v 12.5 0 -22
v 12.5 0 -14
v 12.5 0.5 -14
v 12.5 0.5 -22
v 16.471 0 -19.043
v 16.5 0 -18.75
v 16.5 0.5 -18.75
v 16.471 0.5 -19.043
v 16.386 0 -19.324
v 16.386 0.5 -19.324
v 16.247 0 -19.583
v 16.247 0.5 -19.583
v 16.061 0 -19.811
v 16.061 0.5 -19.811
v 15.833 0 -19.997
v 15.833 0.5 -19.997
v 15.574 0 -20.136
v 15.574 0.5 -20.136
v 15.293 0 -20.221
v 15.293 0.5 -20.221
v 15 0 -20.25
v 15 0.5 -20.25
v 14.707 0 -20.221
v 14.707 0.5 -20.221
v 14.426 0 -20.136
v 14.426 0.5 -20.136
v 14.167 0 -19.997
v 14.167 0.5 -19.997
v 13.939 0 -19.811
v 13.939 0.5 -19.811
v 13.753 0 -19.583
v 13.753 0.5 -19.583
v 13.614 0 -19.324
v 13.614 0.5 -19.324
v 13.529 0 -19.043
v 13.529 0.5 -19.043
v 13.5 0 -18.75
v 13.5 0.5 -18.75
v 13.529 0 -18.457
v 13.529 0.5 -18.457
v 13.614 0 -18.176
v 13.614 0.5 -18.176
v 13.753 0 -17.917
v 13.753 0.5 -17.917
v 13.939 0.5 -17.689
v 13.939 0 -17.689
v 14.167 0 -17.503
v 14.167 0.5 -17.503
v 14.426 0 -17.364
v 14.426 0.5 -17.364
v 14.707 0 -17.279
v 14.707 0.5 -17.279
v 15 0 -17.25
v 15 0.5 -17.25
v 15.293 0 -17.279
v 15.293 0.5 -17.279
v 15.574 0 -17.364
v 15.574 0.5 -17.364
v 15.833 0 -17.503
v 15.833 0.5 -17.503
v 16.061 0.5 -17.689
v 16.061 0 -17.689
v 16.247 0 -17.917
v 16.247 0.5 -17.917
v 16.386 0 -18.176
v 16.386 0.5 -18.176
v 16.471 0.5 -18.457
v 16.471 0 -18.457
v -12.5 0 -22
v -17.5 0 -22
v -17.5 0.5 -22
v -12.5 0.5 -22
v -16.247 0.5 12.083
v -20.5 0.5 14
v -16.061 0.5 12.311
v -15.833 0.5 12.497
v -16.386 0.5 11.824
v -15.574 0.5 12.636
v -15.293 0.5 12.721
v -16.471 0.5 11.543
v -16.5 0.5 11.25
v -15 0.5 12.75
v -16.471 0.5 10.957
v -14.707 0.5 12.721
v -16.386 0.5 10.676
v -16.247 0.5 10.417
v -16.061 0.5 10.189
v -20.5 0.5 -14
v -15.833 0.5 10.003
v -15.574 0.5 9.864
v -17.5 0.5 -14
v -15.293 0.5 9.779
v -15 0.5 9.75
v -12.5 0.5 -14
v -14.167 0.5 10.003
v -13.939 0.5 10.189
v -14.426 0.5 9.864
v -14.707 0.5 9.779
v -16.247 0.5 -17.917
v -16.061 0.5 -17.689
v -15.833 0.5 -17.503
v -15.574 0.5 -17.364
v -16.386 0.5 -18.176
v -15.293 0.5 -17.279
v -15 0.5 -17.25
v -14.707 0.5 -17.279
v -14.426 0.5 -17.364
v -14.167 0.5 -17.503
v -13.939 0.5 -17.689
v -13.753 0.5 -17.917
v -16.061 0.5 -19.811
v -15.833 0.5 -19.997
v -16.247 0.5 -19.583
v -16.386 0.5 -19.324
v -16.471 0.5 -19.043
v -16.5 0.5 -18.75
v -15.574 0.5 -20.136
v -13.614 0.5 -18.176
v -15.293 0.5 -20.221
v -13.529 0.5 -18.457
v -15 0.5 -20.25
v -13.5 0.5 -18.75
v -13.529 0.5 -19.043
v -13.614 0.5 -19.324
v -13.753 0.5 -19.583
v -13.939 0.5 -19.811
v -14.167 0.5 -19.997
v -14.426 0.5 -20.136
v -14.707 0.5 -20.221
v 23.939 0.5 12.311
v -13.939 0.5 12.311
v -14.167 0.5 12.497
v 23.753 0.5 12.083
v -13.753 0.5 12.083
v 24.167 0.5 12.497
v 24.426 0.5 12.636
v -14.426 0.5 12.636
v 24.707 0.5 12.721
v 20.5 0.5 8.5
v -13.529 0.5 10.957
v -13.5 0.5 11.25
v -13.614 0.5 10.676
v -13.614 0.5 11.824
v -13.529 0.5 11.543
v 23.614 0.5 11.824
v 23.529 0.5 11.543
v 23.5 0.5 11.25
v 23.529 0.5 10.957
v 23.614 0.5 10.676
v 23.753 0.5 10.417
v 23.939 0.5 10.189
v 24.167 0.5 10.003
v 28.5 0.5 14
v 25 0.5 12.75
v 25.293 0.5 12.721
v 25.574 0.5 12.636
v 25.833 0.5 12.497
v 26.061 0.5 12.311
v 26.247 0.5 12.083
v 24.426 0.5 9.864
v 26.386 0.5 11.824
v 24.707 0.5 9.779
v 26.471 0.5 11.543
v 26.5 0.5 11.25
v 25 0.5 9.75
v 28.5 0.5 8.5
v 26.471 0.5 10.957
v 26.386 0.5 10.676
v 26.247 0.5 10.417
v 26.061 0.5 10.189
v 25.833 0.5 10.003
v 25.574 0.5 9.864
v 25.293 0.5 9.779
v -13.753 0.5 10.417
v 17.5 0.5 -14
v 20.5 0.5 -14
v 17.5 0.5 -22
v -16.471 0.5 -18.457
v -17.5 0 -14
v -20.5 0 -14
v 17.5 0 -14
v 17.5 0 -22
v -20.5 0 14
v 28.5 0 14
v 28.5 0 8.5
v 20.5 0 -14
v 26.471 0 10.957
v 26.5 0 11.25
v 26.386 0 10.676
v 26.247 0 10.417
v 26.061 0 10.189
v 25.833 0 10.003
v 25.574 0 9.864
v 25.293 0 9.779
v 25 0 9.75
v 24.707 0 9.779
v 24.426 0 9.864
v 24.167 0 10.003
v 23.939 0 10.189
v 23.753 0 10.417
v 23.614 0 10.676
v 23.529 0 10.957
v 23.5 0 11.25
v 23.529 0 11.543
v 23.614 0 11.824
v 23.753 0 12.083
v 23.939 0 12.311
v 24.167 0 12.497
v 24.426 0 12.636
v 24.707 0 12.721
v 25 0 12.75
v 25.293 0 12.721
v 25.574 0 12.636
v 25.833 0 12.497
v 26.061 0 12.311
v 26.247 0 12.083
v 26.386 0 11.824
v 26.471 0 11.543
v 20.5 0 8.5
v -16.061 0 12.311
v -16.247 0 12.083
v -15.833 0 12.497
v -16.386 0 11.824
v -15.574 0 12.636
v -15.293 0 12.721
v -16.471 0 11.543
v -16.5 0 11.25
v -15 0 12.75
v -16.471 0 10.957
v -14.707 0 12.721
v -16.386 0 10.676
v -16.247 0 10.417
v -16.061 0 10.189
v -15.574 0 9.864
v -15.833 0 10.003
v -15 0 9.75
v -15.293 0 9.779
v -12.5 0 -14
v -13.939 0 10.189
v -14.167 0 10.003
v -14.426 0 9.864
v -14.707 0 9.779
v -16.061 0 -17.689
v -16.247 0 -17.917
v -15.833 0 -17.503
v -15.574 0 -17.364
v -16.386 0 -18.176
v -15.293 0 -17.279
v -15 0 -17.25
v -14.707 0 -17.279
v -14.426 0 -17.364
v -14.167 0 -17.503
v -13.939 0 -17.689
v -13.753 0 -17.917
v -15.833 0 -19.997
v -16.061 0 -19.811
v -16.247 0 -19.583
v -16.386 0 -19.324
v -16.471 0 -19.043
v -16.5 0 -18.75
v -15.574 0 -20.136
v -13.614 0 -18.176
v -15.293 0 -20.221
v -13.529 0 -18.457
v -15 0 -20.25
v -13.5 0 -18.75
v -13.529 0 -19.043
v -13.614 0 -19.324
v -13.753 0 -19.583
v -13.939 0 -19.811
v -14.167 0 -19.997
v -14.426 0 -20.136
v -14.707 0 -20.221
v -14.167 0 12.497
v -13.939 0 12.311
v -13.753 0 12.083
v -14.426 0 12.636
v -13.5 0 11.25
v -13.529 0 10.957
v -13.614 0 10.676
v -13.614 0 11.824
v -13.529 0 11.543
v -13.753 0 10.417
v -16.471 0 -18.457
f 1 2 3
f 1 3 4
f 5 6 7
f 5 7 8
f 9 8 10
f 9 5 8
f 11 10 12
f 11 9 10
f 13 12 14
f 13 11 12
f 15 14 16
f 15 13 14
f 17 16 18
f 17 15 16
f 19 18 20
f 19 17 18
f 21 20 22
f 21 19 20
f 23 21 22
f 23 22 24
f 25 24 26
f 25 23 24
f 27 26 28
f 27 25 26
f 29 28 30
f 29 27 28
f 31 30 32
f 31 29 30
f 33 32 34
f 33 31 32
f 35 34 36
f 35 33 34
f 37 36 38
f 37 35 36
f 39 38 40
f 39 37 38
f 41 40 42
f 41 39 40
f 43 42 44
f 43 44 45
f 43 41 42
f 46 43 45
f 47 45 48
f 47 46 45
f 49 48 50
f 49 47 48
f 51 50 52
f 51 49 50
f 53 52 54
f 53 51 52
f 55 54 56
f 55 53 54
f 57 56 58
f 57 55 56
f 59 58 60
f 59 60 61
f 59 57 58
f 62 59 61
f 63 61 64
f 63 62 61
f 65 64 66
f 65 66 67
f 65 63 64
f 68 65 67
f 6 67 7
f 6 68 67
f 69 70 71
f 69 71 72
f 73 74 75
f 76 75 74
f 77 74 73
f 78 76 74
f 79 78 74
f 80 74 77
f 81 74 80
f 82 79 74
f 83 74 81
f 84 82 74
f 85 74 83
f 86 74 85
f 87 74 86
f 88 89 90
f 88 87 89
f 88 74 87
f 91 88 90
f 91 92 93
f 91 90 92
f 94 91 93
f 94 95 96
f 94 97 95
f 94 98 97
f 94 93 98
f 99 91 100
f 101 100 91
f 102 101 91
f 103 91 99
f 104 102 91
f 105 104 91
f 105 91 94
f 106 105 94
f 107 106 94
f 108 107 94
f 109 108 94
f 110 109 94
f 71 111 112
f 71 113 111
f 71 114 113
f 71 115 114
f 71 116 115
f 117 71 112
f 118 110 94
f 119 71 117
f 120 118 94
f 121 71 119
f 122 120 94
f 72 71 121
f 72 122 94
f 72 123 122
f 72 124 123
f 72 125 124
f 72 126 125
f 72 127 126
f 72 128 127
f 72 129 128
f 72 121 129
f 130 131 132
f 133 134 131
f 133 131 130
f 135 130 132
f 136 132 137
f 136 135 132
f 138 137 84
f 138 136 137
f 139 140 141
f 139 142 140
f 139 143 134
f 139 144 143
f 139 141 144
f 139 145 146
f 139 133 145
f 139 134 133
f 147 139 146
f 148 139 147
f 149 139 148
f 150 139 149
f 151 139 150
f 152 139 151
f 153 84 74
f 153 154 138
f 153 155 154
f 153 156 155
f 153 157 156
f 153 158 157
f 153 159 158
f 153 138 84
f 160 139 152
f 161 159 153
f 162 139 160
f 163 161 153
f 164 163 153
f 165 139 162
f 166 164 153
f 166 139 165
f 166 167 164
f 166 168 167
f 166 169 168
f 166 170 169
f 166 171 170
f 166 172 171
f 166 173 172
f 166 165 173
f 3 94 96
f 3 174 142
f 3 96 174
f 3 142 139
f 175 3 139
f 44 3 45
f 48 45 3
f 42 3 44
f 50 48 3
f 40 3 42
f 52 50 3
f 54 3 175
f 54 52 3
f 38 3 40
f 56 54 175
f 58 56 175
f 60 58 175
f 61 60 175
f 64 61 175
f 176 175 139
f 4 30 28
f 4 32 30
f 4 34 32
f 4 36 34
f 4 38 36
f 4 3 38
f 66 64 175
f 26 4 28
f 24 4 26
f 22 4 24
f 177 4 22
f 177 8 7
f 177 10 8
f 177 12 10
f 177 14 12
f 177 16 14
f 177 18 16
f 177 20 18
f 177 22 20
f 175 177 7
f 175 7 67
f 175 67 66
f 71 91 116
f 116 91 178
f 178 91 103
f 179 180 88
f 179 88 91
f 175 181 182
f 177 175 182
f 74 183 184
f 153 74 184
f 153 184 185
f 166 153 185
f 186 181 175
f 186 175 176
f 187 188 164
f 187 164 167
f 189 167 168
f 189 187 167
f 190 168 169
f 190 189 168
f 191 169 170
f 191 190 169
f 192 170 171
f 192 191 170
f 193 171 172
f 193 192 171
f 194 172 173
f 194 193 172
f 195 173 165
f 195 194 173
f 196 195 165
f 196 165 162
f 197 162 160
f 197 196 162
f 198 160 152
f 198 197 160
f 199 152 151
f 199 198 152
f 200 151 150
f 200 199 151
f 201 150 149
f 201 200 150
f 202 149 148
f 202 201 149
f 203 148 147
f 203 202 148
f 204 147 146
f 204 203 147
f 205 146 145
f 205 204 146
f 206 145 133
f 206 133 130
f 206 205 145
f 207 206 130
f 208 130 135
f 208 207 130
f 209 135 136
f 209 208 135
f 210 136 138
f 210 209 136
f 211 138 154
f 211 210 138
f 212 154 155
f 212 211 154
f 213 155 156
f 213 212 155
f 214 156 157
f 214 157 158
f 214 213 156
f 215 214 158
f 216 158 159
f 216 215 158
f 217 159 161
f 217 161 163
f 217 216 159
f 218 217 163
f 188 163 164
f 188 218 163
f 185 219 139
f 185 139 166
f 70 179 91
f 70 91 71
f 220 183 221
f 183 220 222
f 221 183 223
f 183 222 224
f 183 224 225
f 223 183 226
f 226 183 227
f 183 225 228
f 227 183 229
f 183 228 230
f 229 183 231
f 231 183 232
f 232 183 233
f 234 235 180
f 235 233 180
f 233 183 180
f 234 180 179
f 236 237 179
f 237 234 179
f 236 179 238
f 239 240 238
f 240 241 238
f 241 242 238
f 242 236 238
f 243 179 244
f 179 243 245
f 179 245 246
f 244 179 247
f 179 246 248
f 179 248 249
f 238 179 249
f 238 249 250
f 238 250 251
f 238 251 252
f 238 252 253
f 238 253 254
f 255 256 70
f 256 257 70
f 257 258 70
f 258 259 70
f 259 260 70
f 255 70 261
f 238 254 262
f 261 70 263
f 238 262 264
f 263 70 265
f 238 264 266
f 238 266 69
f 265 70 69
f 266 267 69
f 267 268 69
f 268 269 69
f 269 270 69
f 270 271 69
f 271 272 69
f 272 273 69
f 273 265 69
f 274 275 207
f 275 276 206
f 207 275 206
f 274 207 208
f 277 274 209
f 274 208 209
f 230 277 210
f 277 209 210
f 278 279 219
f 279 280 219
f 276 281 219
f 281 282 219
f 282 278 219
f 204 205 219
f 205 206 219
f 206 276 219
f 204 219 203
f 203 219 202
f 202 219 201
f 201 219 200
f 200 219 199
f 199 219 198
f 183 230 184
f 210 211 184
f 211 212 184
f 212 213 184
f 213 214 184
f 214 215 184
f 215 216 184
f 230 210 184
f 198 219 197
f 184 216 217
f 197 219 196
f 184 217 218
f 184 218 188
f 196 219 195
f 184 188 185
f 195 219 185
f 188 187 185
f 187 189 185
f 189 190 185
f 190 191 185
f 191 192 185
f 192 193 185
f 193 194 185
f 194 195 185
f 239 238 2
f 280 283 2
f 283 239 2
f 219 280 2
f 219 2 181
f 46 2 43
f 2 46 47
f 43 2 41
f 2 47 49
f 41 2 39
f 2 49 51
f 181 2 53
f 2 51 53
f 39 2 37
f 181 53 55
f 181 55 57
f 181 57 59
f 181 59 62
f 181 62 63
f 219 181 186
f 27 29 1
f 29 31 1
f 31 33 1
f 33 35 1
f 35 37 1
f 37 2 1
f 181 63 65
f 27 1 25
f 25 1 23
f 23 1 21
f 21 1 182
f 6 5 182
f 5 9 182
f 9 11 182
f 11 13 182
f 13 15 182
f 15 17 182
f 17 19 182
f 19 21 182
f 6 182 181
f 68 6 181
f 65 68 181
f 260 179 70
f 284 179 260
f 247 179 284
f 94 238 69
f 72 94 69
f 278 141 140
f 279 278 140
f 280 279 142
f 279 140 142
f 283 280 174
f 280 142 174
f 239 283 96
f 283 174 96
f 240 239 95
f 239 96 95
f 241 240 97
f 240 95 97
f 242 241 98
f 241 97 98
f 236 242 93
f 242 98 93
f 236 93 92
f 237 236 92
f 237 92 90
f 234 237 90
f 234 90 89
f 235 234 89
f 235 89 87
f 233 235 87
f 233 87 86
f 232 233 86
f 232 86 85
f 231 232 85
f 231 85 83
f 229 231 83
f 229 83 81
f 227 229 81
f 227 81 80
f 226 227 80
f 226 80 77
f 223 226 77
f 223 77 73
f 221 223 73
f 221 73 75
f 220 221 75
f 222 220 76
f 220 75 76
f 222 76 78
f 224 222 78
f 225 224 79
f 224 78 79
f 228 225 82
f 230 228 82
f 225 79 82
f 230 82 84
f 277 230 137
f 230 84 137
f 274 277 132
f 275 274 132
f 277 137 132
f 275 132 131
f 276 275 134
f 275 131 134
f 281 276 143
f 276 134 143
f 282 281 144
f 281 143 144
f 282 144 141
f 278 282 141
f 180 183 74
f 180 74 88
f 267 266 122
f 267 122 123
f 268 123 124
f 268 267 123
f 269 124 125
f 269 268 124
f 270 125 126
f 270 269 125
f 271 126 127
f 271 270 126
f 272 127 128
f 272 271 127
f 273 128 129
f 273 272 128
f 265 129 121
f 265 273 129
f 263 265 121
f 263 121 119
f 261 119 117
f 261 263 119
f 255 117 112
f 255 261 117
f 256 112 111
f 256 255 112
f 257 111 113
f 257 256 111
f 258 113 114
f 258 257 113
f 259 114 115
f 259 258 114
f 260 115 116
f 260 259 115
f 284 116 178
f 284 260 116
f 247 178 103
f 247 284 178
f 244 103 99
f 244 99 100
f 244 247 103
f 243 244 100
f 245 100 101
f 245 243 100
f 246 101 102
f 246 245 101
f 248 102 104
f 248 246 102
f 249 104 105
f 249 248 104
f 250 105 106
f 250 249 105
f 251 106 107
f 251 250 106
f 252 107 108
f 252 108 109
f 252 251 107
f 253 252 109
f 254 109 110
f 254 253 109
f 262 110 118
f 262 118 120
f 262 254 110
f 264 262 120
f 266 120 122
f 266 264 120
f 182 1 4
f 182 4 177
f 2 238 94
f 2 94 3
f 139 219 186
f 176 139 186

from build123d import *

# Parameters (mm, degrees)
SKETCH1_W           = 41
SKETCH1_H           = 28
BOSS_EXTRUDE1_DEPTH = 0.5
SKETCH2_R           = 1.5
SKETCH2_W           = 5
SKETCH2_H           = 8
SKETCH2_W_2         = 8
SKETCH2_H_2         = 5.5
BOSS_EXTRUDE2_DEPTH = 0.5
SKETCH3_R           = 1.5
CUT_EXTRUDE1_DEPTH  = 1.5


with BuildPart() as part:
    # Sketch1 → Boss-Extrude1 (new body)
    with BuildSketch(Plane(origin=(0, 0, 0), x_dir=(1, 0, 0), z_dir=(0, 1, 0))):
        Rectangle(SKETCH1_W, SKETCH1_H)
    extrude(amount=BOSS_EXTRUDE1_DEPTH)

    # Sketch2 → Boss-Extrude2 (add)
    with BuildSketch(Plane(origin=(0, 0, 0), x_dir=(1, 0, 0), z_dir=(0, 1, 0))):
        with Locations((-15, -11.25)):
            Circle(SKETCH2_R)
        with Locations((-15, 18)):
            Rectangle(SKETCH2_W, SKETCH2_H)
        with Locations((-15, 18.75)):
            Circle(SKETCH2_R, mode=Mode.SUBTRACT)
        with Locations((15, 18)):
            Rectangle(SKETCH2_W, SKETCH2_H)
        with Locations((15, 18.75)):
            Circle(SKETCH2_R, mode=Mode.SUBTRACT)
        with Locations((24.5, -11.25)):
            Rectangle(SKETCH2_W_2, SKETCH2_H_2)
        with Locations((25, -11.25)):
            Circle(SKETCH2_R, mode=Mode.SUBTRACT)
    extrude(amount=BOSS_EXTRUDE2_DEPTH)

    # Sketch3 → Cut-Extrude1 (cut, through all)
    with BuildSketch(Plane(origin=(0, 0.5, 0), x_dir=(1, 0, 0), z_dir=(0, 1, 0))):
        with Locations((-15, -11.25)):
            Circle(SKETCH3_R)
    extrude(amount=-CUT_EXTRUDE1_DEPTH, mode=Mode.SUBTRACT)


solid = part.part
